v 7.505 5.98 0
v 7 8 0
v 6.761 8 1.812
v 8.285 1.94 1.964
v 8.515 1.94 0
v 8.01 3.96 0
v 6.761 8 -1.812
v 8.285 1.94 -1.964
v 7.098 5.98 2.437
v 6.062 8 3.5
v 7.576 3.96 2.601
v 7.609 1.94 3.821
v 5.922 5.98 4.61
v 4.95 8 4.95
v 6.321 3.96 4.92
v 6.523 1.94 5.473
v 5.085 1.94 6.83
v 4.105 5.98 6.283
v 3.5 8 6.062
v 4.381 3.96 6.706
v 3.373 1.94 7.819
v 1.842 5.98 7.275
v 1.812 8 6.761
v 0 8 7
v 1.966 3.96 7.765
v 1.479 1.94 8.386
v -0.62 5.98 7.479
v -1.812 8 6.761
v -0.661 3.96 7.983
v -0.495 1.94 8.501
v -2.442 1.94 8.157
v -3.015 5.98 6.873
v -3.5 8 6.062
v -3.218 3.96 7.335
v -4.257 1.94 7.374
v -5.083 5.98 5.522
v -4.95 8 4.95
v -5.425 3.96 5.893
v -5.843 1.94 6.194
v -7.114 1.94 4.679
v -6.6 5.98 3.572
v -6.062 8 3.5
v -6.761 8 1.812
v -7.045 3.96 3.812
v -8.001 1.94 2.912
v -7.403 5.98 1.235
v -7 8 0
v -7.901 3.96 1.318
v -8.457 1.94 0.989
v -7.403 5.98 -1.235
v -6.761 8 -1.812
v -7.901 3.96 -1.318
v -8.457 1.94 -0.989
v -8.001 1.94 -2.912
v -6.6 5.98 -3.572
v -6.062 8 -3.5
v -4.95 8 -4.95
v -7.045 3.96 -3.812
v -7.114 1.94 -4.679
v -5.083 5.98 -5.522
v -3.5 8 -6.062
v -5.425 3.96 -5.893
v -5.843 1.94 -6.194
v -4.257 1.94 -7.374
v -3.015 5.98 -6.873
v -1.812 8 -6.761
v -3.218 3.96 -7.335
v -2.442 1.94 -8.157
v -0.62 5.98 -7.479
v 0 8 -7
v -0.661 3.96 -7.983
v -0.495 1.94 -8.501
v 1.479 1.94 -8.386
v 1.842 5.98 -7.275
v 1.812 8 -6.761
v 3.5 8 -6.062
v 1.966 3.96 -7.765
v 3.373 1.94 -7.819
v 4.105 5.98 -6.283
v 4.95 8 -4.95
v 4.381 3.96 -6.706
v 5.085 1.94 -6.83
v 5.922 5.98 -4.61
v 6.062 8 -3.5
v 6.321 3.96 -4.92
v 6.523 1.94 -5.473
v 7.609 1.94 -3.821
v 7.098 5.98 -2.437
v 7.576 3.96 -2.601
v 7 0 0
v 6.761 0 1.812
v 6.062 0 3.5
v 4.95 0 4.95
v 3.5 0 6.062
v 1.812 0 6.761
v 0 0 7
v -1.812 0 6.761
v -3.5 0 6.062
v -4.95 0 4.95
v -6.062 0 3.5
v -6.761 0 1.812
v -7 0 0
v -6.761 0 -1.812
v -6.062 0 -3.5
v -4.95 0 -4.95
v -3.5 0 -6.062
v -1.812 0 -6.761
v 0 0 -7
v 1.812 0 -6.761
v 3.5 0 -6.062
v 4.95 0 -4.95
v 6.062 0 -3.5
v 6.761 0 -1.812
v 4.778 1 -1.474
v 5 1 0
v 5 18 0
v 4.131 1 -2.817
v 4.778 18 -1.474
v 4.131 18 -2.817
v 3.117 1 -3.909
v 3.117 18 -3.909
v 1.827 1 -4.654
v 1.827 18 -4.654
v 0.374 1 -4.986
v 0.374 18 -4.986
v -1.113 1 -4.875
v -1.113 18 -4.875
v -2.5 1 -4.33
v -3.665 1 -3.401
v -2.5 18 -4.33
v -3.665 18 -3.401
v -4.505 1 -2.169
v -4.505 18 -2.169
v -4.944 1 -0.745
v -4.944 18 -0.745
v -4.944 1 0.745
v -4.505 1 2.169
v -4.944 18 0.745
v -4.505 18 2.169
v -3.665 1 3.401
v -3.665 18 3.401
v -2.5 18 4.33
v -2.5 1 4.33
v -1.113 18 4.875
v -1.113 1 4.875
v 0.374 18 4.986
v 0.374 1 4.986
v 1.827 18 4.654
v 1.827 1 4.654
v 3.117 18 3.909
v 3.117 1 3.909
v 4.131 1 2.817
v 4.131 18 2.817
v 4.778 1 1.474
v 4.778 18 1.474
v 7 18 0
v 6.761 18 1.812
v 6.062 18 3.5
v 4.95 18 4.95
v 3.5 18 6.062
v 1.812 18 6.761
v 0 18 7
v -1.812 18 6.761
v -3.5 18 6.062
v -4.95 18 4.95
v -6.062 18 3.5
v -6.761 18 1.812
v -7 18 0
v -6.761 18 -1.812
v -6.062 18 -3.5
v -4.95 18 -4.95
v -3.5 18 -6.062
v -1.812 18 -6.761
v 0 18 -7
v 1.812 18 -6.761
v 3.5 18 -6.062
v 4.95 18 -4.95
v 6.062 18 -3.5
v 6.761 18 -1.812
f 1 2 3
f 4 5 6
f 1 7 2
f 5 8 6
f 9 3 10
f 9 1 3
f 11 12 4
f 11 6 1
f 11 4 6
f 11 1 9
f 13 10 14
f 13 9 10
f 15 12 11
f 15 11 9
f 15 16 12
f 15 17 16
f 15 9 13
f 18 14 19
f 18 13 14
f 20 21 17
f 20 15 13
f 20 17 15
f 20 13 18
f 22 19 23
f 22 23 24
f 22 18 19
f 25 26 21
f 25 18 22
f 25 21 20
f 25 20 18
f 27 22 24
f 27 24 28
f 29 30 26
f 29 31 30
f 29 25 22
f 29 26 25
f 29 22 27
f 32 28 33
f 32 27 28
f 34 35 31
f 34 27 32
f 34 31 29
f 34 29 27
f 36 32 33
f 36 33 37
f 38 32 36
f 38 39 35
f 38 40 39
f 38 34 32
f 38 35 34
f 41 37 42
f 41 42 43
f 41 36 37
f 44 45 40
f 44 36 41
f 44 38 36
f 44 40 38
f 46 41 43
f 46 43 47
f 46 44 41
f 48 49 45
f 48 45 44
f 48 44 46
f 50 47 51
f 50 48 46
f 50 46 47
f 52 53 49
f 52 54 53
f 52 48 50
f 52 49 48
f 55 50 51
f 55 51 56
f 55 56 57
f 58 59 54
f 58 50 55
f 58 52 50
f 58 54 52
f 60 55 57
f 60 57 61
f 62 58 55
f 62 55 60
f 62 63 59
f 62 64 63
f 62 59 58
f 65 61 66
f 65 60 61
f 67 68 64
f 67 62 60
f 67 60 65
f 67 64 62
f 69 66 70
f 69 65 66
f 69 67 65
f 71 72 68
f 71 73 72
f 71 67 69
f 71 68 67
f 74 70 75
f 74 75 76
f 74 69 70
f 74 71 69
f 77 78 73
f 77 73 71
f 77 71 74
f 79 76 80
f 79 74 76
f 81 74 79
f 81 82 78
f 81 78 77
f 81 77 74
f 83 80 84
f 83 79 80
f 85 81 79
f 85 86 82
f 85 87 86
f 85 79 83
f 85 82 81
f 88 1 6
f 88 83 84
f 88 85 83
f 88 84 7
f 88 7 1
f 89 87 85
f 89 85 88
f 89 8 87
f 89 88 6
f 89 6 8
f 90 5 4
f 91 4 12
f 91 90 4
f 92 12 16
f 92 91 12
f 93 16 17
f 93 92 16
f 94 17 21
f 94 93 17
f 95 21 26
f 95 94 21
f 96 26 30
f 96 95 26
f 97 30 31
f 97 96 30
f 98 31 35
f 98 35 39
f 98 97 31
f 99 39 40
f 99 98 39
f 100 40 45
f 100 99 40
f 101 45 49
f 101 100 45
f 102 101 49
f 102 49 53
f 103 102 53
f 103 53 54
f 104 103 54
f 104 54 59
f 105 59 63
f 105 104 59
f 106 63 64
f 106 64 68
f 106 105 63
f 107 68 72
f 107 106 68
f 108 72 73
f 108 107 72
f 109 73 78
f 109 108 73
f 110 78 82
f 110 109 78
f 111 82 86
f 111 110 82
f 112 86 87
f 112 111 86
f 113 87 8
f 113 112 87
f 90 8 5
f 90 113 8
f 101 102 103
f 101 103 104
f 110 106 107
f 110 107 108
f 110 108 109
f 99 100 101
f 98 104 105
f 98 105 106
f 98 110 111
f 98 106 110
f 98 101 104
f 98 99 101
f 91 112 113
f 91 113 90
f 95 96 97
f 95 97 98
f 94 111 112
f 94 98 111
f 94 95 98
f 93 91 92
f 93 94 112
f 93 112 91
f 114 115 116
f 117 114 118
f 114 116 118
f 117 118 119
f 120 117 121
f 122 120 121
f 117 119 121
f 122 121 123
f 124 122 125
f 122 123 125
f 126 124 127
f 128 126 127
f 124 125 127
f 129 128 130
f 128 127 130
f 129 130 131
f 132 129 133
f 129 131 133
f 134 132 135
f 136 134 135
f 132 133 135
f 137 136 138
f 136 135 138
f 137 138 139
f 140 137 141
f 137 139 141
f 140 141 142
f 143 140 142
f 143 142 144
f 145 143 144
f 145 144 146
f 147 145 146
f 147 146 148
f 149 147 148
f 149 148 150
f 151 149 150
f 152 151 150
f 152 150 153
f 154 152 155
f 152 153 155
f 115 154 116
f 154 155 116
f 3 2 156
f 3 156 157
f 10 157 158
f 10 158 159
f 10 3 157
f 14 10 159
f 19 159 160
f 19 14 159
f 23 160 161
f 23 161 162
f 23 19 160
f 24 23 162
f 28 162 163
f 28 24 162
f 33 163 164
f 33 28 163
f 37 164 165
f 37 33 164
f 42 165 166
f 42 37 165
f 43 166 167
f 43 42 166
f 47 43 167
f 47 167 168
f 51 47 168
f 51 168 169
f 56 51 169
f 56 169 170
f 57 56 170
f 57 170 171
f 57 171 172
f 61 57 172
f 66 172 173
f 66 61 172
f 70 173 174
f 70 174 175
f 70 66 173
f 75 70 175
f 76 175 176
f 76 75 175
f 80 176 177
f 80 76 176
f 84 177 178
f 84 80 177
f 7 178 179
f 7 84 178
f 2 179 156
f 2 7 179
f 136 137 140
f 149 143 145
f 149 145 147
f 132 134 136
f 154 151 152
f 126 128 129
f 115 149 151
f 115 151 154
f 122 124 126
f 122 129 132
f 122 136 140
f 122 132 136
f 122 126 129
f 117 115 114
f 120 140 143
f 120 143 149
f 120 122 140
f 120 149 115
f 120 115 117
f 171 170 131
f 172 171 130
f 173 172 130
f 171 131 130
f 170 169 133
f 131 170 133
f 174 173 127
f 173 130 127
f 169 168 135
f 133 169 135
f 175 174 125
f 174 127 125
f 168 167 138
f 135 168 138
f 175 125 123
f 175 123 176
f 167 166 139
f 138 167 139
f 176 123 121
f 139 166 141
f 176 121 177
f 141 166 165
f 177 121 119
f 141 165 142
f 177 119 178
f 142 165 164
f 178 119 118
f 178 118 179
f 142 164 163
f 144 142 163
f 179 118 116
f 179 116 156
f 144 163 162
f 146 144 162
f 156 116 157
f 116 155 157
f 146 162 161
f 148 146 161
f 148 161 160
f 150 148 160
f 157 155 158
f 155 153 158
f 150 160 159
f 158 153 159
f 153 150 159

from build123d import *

# Parameters (mm, degrees)
SKETCH001_R  = 7
SKETCH_R     = 9
PAD_DEPTH    = 10
SKETCH002_R  = 5
POCKET_DEPTH = 17
CHAMFER_SIZE = 2


with BuildPart() as part:
    # Sketch001 → AdditiveLoft section 0
    with BuildSketch(Plane.XZ.offset(-8)):
        Circle(SKETCH001_R)
    # Sketch → AdditiveLoft section 1
    with BuildSketch(Plane.XZ):
        Circle(SKETCH_R)
    loft()

    # Sketch001 → Pad (new body)
    with BuildSketch(Plane.XZ.offset(-8)):
        Circle(SKETCH001_R)
    extrude(amount=-PAD_DEPTH)

    # Sketch002 (on Face4 of Pad) → Pocket (cut)
    with BuildSketch(Plane(origin=(0, 18, 0), x_dir=(1, 0, 0), z_dir=(0, 1, 0))):
        Circle(SKETCH002_R)
    extrude(amount=-POCKET_DEPTH, mode=Mode.SUBTRACT)

    # Chamfer
    chamfer_edges = [part.edges().sort_by_distance(p)[0] for p in [
        (-9, 0, 0),
    ]]
    chamfer(chamfer_edges, length=CHAMFER_SIZE)


solid = part.part
